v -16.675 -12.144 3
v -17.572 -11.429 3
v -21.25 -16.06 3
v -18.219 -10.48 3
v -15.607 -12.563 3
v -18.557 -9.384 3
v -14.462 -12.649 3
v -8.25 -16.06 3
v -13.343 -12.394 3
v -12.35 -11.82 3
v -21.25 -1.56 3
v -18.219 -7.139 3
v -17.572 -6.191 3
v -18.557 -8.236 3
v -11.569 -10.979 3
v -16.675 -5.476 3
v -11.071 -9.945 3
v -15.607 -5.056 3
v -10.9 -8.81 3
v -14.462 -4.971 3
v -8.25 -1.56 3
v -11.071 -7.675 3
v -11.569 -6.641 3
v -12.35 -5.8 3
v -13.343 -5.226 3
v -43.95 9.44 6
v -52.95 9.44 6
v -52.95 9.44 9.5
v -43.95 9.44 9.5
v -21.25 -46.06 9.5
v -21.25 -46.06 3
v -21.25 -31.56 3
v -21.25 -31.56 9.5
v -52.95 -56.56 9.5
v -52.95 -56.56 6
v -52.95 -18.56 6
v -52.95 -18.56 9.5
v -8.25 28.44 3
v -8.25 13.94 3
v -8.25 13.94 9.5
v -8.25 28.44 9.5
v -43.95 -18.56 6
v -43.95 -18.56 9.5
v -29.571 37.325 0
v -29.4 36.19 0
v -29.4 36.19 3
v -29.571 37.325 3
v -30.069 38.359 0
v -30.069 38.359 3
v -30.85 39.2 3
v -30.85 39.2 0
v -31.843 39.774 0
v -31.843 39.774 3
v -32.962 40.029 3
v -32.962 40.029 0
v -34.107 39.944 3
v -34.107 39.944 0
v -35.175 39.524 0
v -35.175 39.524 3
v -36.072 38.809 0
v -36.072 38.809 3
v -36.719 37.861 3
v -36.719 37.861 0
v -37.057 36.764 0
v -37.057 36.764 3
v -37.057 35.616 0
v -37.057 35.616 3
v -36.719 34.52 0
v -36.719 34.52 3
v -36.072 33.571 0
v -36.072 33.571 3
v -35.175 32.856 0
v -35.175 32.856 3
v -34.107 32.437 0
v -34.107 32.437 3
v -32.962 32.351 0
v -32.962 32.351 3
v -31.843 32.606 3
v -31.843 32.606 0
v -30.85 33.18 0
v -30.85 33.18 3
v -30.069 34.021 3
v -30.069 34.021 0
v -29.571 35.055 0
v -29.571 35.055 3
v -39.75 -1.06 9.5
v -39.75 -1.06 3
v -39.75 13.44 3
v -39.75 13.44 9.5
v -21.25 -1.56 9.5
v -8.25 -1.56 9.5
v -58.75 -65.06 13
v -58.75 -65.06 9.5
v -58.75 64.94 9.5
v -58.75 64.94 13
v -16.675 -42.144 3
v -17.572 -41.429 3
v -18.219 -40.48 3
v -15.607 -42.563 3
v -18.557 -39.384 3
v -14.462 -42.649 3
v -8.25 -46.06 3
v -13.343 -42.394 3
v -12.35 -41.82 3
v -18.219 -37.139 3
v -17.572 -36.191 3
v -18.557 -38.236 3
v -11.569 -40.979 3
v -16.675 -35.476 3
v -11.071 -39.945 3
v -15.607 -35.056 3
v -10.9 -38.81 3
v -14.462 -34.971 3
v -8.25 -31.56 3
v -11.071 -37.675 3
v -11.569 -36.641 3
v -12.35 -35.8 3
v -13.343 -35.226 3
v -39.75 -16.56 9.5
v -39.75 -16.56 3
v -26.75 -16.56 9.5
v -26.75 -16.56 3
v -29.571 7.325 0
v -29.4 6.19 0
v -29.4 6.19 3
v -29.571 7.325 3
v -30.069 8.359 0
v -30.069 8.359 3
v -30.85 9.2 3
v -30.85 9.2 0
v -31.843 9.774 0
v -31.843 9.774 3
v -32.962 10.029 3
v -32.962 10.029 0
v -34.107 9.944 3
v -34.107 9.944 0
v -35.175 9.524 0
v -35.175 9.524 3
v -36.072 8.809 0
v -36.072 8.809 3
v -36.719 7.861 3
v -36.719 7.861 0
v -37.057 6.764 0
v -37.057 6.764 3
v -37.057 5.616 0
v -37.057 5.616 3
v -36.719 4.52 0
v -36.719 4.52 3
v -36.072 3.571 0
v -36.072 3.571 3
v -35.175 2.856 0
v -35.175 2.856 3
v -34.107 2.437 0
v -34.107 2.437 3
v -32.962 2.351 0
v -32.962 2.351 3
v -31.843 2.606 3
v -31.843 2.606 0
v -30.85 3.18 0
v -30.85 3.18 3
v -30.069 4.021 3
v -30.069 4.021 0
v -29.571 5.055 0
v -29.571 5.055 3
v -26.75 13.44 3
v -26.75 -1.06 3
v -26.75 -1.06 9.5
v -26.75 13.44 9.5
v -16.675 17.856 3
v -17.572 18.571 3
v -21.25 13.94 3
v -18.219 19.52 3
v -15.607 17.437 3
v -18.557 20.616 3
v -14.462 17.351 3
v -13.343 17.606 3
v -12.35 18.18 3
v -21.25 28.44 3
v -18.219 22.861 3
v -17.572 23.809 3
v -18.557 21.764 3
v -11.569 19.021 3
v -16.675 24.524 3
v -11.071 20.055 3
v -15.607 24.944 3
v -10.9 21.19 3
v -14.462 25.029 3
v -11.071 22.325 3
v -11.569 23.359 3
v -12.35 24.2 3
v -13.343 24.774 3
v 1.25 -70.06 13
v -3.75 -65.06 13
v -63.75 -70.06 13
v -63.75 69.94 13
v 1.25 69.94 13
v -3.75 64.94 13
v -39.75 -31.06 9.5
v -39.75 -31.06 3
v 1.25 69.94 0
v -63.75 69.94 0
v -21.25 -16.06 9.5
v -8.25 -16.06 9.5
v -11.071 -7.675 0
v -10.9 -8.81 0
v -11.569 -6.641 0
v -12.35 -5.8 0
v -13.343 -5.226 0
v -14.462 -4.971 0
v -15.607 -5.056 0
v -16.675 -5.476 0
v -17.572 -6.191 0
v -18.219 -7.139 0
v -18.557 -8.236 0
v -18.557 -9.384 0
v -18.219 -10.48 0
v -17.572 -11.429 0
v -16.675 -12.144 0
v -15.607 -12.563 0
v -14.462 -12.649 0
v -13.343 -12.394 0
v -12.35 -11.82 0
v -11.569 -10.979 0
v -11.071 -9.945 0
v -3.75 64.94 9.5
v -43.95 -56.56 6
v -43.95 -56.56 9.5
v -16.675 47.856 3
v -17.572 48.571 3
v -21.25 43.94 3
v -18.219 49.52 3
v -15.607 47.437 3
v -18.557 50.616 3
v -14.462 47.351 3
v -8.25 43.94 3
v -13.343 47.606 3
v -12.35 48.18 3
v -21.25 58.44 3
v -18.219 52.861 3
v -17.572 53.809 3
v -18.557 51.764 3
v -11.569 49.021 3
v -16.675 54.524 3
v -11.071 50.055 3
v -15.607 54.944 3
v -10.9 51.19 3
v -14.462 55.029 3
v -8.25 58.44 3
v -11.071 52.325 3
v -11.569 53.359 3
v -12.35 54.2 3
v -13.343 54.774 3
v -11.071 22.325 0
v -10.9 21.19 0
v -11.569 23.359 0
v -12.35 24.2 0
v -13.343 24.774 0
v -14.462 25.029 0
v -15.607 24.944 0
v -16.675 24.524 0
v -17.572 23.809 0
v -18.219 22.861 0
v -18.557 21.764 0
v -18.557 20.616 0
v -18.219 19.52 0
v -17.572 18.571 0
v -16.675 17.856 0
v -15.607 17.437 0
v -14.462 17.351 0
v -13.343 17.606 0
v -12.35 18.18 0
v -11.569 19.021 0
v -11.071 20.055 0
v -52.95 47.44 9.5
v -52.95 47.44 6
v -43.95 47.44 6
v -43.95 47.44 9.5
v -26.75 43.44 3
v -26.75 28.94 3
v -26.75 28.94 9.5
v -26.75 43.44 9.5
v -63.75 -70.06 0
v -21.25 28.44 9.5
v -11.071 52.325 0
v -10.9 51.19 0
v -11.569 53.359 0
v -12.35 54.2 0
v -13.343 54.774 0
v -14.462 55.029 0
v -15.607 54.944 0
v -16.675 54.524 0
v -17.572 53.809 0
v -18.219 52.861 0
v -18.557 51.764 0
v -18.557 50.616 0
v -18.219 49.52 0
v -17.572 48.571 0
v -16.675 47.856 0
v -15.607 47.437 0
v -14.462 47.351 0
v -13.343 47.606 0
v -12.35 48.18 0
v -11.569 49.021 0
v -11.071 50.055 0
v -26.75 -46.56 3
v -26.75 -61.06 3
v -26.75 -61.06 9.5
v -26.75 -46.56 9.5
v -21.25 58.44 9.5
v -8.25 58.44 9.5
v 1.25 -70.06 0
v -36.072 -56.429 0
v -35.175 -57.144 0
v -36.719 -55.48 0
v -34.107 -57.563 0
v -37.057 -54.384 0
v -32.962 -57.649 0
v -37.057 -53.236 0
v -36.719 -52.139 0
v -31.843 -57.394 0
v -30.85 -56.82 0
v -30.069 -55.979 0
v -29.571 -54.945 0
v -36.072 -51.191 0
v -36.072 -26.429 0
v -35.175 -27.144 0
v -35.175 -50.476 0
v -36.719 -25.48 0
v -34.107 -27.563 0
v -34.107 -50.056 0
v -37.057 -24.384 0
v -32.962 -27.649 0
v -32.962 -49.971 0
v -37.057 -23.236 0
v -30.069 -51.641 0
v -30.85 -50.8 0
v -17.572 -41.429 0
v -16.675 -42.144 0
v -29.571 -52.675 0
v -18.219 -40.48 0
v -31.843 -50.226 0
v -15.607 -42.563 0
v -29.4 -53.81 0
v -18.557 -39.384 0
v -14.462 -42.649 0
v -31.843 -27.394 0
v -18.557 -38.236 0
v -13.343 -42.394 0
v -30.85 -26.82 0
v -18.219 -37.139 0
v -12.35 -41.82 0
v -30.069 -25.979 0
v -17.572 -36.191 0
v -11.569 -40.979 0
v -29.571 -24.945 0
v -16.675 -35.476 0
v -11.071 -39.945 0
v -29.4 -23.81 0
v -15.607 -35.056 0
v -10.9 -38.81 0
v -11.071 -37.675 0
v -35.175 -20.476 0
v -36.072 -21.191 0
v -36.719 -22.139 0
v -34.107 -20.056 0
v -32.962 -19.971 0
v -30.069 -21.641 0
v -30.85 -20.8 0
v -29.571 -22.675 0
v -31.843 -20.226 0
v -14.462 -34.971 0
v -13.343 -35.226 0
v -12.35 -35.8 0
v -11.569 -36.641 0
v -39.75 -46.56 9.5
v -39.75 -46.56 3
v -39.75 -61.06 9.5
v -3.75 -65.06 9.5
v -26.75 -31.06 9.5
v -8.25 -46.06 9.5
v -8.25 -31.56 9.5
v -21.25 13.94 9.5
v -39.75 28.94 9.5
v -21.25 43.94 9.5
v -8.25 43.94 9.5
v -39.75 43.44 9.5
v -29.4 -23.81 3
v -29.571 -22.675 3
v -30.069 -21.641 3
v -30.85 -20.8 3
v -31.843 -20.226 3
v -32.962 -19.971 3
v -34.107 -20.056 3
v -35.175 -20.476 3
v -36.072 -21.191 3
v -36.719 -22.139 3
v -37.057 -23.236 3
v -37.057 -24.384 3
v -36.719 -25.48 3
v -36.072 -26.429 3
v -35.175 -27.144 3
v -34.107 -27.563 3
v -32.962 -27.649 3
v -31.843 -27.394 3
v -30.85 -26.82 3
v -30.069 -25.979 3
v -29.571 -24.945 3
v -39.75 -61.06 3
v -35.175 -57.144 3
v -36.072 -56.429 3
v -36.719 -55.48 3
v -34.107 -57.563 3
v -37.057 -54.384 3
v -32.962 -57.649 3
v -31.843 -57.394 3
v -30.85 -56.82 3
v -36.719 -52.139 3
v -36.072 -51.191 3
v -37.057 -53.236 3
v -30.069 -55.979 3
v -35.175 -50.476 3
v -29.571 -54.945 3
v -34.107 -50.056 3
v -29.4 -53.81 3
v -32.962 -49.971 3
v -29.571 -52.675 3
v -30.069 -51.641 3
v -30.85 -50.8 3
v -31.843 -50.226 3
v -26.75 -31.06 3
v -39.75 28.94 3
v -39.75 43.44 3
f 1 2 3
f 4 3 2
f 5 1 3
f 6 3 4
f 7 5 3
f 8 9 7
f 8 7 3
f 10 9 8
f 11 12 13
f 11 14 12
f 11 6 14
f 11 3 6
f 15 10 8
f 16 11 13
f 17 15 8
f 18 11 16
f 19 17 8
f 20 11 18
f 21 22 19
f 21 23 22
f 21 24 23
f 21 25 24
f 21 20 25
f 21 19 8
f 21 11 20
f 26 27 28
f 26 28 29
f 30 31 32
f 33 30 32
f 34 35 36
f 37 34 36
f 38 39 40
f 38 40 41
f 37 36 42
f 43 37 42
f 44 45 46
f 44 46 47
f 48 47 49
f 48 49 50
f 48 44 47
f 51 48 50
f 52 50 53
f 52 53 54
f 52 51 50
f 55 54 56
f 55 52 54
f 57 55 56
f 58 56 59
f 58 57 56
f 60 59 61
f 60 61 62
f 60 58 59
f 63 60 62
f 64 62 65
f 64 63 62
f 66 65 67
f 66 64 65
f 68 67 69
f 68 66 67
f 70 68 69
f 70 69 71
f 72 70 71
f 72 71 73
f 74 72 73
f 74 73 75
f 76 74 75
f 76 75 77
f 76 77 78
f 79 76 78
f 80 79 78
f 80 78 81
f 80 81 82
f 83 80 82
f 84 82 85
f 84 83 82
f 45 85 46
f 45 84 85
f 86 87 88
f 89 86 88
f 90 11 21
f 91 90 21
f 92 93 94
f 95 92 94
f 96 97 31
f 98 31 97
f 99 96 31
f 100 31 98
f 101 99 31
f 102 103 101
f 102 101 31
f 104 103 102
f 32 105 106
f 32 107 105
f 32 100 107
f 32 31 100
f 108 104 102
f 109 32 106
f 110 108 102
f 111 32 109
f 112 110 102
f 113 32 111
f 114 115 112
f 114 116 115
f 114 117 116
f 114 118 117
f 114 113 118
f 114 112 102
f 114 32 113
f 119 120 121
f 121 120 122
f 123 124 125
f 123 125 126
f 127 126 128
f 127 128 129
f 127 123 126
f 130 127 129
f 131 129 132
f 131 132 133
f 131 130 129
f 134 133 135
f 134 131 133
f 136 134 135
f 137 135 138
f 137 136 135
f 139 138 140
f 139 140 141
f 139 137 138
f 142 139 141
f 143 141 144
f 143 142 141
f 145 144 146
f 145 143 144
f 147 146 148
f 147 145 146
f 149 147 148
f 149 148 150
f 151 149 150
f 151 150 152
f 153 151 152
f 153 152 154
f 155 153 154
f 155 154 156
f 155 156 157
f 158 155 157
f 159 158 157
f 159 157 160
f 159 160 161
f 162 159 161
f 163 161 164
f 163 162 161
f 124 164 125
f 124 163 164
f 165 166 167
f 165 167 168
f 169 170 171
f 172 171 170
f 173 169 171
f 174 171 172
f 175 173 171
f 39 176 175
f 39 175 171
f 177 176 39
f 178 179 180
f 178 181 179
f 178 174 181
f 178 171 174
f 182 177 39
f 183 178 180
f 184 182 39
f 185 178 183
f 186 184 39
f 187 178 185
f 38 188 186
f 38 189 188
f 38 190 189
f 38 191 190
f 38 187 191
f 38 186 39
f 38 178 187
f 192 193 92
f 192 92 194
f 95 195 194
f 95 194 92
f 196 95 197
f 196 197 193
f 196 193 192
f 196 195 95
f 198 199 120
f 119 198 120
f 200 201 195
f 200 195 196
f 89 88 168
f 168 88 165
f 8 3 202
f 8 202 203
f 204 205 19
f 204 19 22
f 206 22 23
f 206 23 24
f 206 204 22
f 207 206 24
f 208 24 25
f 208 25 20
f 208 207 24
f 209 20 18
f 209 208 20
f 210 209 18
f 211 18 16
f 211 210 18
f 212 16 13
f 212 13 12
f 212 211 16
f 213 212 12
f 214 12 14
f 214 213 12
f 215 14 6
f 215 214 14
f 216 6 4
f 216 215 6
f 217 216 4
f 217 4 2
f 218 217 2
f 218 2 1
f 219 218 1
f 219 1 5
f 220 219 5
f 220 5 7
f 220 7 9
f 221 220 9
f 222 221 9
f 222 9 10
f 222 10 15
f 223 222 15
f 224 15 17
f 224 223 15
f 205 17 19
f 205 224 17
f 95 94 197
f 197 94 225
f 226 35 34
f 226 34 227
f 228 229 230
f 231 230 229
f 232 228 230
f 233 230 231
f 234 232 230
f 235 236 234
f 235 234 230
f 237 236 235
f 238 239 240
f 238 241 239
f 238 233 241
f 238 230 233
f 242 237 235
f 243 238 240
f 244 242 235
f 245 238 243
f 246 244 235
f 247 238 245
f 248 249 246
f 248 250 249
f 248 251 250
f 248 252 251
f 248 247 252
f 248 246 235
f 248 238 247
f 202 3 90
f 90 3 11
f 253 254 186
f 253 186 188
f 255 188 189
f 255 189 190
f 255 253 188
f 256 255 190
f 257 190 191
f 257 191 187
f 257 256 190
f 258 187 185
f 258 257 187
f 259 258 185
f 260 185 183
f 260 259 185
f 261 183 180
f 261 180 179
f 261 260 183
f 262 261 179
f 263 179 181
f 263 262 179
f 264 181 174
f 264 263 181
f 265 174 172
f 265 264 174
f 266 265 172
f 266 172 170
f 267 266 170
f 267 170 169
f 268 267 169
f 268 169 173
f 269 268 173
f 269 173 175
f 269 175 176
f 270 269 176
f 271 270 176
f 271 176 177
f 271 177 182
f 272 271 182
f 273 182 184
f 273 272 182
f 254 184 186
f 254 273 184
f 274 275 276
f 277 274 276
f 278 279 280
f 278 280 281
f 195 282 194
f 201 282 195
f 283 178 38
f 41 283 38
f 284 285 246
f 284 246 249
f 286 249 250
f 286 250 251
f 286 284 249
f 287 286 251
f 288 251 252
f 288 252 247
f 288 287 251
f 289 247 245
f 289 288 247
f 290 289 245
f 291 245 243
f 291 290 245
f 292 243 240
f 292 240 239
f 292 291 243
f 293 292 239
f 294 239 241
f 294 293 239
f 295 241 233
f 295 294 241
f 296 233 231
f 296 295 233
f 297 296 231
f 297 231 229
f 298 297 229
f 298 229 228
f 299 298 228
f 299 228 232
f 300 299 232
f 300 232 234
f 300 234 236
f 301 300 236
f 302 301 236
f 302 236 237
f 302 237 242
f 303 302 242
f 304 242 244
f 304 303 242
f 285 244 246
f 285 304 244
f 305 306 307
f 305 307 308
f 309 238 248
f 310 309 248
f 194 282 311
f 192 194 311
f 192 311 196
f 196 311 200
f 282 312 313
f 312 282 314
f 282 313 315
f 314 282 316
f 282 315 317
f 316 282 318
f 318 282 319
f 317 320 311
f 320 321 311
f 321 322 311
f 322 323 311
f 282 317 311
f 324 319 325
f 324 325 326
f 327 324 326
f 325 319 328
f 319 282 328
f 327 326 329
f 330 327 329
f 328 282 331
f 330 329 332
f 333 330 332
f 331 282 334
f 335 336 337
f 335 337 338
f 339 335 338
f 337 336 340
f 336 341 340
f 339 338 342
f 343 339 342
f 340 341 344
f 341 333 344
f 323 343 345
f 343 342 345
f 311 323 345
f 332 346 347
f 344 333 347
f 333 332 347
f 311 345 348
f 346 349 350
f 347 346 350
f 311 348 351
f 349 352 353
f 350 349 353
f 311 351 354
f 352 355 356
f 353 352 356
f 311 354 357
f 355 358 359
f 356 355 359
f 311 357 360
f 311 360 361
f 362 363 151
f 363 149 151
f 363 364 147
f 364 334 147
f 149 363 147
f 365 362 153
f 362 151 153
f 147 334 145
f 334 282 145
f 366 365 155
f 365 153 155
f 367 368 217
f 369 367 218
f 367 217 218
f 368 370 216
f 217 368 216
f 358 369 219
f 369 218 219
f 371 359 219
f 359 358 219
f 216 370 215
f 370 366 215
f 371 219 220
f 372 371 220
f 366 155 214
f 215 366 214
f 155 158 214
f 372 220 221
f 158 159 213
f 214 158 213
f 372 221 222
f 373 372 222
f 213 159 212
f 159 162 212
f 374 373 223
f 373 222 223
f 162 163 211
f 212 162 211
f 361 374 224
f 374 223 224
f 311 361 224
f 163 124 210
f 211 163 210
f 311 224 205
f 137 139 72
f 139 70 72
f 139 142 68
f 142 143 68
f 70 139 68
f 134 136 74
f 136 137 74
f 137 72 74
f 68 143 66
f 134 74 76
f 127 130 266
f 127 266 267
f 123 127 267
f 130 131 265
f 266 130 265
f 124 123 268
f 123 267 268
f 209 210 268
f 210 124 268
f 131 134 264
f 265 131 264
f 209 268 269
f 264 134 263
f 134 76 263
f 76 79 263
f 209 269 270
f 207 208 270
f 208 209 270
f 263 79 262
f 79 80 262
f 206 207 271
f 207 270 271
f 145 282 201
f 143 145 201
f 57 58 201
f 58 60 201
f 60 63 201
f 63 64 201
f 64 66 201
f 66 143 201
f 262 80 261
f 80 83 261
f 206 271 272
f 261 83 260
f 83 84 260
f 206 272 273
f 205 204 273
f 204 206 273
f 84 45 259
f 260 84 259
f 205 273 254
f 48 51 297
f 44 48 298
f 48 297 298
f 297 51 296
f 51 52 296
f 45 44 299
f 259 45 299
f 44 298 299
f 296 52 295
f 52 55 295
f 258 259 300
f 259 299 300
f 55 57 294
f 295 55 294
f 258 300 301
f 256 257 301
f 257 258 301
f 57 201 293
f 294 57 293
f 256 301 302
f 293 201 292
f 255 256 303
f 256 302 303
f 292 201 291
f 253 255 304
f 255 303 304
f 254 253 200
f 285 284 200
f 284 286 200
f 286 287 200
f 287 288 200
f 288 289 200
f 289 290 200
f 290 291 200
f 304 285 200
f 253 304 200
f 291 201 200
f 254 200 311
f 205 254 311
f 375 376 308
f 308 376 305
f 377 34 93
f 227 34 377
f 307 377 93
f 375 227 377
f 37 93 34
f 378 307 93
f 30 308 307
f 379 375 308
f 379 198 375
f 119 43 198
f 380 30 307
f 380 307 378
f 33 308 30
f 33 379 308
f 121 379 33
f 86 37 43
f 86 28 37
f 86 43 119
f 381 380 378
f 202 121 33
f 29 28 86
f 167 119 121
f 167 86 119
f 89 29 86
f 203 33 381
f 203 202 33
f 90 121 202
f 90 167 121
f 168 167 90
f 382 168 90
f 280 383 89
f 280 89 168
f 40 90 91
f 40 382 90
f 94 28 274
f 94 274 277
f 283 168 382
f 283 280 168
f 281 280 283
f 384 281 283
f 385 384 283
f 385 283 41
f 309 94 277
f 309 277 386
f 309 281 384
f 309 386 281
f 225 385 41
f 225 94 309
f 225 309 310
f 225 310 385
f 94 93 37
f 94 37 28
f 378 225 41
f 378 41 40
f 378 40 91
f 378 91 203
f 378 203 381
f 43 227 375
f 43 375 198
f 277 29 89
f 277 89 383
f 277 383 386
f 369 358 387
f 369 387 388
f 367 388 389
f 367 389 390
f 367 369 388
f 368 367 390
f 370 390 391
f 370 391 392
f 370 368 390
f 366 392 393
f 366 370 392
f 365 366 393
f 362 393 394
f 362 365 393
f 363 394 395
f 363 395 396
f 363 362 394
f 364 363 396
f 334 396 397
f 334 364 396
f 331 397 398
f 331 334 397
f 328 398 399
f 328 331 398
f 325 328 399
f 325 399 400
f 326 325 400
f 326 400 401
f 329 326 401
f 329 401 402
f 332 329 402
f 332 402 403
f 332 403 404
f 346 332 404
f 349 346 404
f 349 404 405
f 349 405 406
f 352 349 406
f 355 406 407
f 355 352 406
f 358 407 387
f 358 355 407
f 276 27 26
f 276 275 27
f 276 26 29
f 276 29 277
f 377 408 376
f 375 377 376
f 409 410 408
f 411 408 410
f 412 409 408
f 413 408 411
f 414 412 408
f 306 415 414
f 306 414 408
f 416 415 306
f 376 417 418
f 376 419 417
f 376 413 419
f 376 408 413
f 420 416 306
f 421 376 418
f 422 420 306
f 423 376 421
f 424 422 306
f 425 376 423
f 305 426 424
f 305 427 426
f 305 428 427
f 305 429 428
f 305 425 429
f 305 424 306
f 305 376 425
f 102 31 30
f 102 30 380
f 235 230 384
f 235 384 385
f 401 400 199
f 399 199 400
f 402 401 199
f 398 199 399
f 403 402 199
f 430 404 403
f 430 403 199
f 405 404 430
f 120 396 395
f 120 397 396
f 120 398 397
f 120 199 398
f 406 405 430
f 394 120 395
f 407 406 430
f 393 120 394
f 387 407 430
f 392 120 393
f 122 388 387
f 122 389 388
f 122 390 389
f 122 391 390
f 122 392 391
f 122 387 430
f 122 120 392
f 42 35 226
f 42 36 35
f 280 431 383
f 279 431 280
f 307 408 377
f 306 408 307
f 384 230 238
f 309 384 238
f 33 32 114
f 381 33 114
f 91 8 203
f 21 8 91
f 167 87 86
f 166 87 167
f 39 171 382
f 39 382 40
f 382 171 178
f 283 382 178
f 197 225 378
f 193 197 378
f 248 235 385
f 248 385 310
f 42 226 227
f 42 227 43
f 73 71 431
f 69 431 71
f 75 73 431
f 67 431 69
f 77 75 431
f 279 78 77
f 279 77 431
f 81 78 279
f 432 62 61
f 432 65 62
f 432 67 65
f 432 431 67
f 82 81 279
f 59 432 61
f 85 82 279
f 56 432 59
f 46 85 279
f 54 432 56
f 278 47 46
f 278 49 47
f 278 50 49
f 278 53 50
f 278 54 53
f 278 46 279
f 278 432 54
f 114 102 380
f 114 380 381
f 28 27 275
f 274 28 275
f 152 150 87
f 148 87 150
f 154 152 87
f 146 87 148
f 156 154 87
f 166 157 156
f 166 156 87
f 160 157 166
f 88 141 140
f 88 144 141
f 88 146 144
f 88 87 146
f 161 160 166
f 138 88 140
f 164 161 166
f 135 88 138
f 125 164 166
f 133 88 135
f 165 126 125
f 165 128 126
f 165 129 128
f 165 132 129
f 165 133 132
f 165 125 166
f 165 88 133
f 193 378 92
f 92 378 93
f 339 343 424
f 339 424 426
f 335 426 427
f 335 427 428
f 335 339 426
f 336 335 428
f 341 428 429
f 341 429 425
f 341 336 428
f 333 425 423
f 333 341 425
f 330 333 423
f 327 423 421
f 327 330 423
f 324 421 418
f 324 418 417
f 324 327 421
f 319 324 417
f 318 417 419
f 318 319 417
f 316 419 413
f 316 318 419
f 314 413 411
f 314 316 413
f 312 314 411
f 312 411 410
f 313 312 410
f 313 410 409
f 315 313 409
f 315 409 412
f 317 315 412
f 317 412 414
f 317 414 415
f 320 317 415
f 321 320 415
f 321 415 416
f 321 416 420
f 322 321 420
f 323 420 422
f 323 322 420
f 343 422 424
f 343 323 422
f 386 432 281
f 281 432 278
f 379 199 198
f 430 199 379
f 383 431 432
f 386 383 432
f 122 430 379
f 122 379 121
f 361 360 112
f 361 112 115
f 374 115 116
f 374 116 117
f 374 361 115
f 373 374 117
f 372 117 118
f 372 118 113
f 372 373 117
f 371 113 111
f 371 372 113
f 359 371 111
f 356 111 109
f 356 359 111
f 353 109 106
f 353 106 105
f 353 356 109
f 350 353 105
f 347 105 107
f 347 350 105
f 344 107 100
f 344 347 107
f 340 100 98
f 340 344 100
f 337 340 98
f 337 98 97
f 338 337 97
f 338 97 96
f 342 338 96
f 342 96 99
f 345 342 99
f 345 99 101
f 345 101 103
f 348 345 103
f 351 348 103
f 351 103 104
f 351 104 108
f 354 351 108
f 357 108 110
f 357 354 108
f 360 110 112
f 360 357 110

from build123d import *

# Parameters (mm, degrees)
F0_W     = 65
F0_H     = 140
F0_W_2   = 9
F0_H_2   = 38
F0_W_3   = 13
F0_H_3   = 14.5
F0_R     = 3.85
F1_DEPTH = 3
F2_DEPTH = 6
F3_DEPTH = 9.5
F4_DEPTH = 13


# Not quite as in the source:
# - a feature names something its author has since deleted; it is built from what else it names


with BuildPart() as f1:
    # F0 (on Top) → F1 (new body)
    with BuildSketch(Plane.XY):
        with Locations((-31.25, -0.0599437952)):
            Rectangle(F0_W, F0_H)
        Polygon((-58.75, -65.0599437952), (-58.75, 64.9400562048), (-3.75, 64.9400562048), (-3.75, 60.4400562048), (-3.75, 49.5400562048), (-3.75, -65.0599437952), align=None, mode=Mode.SUBTRACT)
        Polygon((-3.75, 64.9400562048), (-58.75, 64.9400562048), (-58.75, -65.0599437952), (-3.75, -65.0599437952), (-3.75, 49.5400562048), (-3.75, 60.4400562048), align=None)
        with Locations((-48.45, -37.5599437952)):
            Rectangle(F0_W_2, F0_H_2, mode=Mode.SUBTRACT)
        with Locations((-33.25, -53.8099437952)):
            Rectangle(F0_W_3, F0_H_3, mode=Mode.SUBTRACT)
        with Locations((-33.25, -23.8099437952)):
            Rectangle(F0_W_3, F0_H_3, mode=Mode.SUBTRACT)
        with Locations((-14.75, -38.8099437952)):
            Rectangle(F0_W_3, F0_H_3, mode=Mode.SUBTRACT)
        with Locations((-14.75, -8.8099437952)):
            Rectangle(F0_W_3, F0_H_3, mode=Mode.SUBTRACT)
        with Locations((-48.45, 28.4400562048)):
            Rectangle(F0_W_2, F0_H_2, mode=Mode.SUBTRACT)
        with Locations((-33.25, 6.1900562048)):
            Rectangle(F0_W_3, F0_H_3, mode=Mode.SUBTRACT)
        with Locations((-33.25, 36.1900562048)):
            Rectangle(F0_W_3, F0_H_3, mode=Mode.SUBTRACT)
        with Locations((-14.75, 21.1900562048)):
            Rectangle(F0_W_3, F0_H_3, mode=Mode.SUBTRACT)
        with Locations((-14.75, 51.1900562048)):
            Rectangle(F0_W_3, F0_H_3, mode=Mode.SUBTRACT)
        with Locations((-48.45, 28.4400562048)):
            Rectangle(F0_W_2, F0_H_2)
        with Locations((-48.45, -37.5599437952)):
            Rectangle(F0_W_2, F0_H_2)
        with Locations((-14.75, 51.1900562048)):
            Rectangle(F0_W_3, F0_H_3)
        with Locations((-14.75, 51.1900562048)):
            Circle(F0_R, mode=Mode.SUBTRACT)
        with Locations((-33.25, 36.1900562048)):
            Rectangle(F0_W_3, F0_H_3)
        with Locations((-33.25, 36.1900562048)):
            Circle(F0_R, mode=Mode.SUBTRACT)
        with Locations((-14.75, 21.1900562048)):
            Rectangle(F0_W_3, F0_H_3)
        with Locations((-14.75, 21.1900562048)):
            Circle(F0_R, mode=Mode.SUBTRACT)
        with Locations((-33.25, 6.1900562048)):
            Rectangle(F0_W_3, F0_H_3)
        with Locations((-33.25, 6.1900562048)):
            Circle(F0_R, mode=Mode.SUBTRACT)
        with Locations((-14.75, -8.8099437952)):
            Rectangle(F0_W_3, F0_H_3)
        with Locations((-14.75, -8.8099437952)):
            Circle(F0_R, mode=Mode.SUBTRACT)
        with Locations((-33.25, -23.8099437952)):
            Rectangle(F0_W_3, F0_H_3)
        with Locations((-33.25, -23.8099437952)):
            Circle(F0_R, mode=Mode.SUBTRACT)
        with Locations((-33.25, -53.8099437952)):
            Rectangle(F0_W_3, F0_H_3)
        with Locations((-33.25, -53.8099437952)):
            Circle(F0_R, mode=Mode.SUBTRACT)
        with Locations((-14.75, -38.8099437952)):
            Rectangle(F0_W_3, F0_H_3)
        with Locations((-14.75, -38.8099437952)):
            Circle(F0_R, mode=Mode.SUBTRACT)
    extrude(amount=F1_DEPTH)

    # F0 (on Top) → F2 (join)
    with BuildSketch(Plane.XY):
        with Locations((-31.25, -0.0599437952)):
            Rectangle(F0_W, F0_H)
        Polygon((-58.75, -65.0599437952), (-58.75, 64.9400562048), (-3.75, 64.9400562048), (-3.75, 60.4400562048), (-3.75, 49.5400562048), (-3.75, -65.0599437952), align=None, mode=Mode.SUBTRACT)
        Polygon((-3.75, 64.9400562048), (-58.75, 64.9400562048), (-58.75, -65.0599437952), (-3.75, -65.0599437952), (-3.75, 49.5400562048), (-3.75, 60.4400562048), align=None)
        with Locations((-48.45, -37.5599437952)):
            Rectangle(F0_W_2, F0_H_2, mode=Mode.SUBTRACT)
        with Locations((-33.25, -53.8099437952)):
            Rectangle(F0_W_3, F0_H_3, mode=Mode.SUBTRACT)
        with Locations((-33.25, -23.8099437952)):
            Rectangle(F0_W_3, F0_H_3, mode=Mode.SUBTRACT)
        with Locations((-14.75, -38.8099437952)):
            Rectangle(F0_W_3, F0_H_3, mode=Mode.SUBTRACT)
        with Locations((-14.75, -8.8099437952)):
            Rectangle(F0_W_3, F0_H_3, mode=Mode.SUBTRACT)
        with Locations((-48.45, 28.4400562048)):
            Rectangle(F0_W_2, F0_H_2, mode=Mode.SUBTRACT)
        with Locations((-33.25, 6.1900562048)):
            Rectangle(F0_W_3, F0_H_3, mode=Mode.SUBTRACT)
        with Locations((-33.25, 36.1900562048)):
            Rectangle(F0_W_3, F0_H_3, mode=Mode.SUBTRACT)
        with Locations((-14.75, 21.1900562048)):
            Rectangle(F0_W_3, F0_H_3, mode=Mode.SUBTRACT)
        with Locations((-14.75, 51.1900562048)):
            Rectangle(F0_W_3, F0_H_3, mode=Mode.SUBTRACT)
        with Locations((-48.45, 28.4400562048)):
            Rectangle(F0_W_2, F0_H_2)
        with Locations((-48.45, -37.5599437952)):
            Rectangle(F0_W_2, F0_H_2)
    extrude(amount=F2_DEPTH)

    # F0 (on Top) → F3 (join)
    with BuildSketch(Plane.XY):
        with Locations((-31.25, -0.0599437952)):
            Rectangle(F0_W, F0_H)
        Polygon((-58.75, -65.0599437952), (-58.75, 64.9400562048), (-3.75, 64.9400562048), (-3.75, 60.4400562048), (-3.75, 49.5400562048), (-3.75, -65.0599437952), align=None, mode=Mode.SUBTRACT)
        Polygon((-3.75, 64.9400562048), (-58.75, 64.9400562048), (-58.75, -65.0599437952), (-3.75, -65.0599437952), (-3.75, 49.5400562048), (-3.75, 60.4400562048), align=None)
        with Locations((-48.45, -37.5599437952)):
            Rectangle(F0_W_2, F0_H_2, mode=Mode.SUBTRACT)
        with Locations((-33.25, -53.8099437952)):
            Rectangle(F0_W_3, F0_H_3, mode=Mode.SUBTRACT)
        with Locations((-33.25, -23.8099437952)):
            Rectangle(F0_W_3, F0_H_3, mode=Mode.SUBTRACT)
        with Locations((-14.75, -38.8099437952)):
            Rectangle(F0_W_3, F0_H_3, mode=Mode.SUBTRACT)
        with Locations((-14.75, -8.8099437952)):
            Rectangle(F0_W_3, F0_H_3, mode=Mode.SUBTRACT)
        with Locations((-48.45, 28.4400562048)):
            Rectangle(F0_W_2, F0_H_2, mode=Mode.SUBTRACT)
        with Locations((-33.25, 6.1900562048)):
            Rectangle(F0_W_3, F0_H_3, mode=Mode.SUBTRACT)
        with Locations((-33.25, 36.1900562048)):
            Rectangle(F0_W_3, F0_H_3, mode=Mode.SUBTRACT)
        with Locations((-14.75, 21.1900562048)):
            Rectangle(F0_W_3, F0_H_3, mode=Mode.SUBTRACT)
        with Locations((-14.75, 51.1900562048)):
            Rectangle(F0_W_3, F0_H_3, mode=Mode.SUBTRACT)
    extrude(amount=F3_DEPTH)

    # F0 (on Top) → F4 (join)
    with BuildSketch(Plane.XY):
        with Locations((-31.25, -0.0599437952)):
            Rectangle(F0_W, F0_H)
        Polygon((-58.75, -65.0599437952), (-58.75, 64.9400562048), (-3.75, 64.9400562048), (-3.75, 60.4400562048), (-3.75, 49.5400562048), (-3.75, -65.0599437952), align=None, mode=Mode.SUBTRACT)
    extrude(amount=F4_DEPTH)


solid = f1.part
